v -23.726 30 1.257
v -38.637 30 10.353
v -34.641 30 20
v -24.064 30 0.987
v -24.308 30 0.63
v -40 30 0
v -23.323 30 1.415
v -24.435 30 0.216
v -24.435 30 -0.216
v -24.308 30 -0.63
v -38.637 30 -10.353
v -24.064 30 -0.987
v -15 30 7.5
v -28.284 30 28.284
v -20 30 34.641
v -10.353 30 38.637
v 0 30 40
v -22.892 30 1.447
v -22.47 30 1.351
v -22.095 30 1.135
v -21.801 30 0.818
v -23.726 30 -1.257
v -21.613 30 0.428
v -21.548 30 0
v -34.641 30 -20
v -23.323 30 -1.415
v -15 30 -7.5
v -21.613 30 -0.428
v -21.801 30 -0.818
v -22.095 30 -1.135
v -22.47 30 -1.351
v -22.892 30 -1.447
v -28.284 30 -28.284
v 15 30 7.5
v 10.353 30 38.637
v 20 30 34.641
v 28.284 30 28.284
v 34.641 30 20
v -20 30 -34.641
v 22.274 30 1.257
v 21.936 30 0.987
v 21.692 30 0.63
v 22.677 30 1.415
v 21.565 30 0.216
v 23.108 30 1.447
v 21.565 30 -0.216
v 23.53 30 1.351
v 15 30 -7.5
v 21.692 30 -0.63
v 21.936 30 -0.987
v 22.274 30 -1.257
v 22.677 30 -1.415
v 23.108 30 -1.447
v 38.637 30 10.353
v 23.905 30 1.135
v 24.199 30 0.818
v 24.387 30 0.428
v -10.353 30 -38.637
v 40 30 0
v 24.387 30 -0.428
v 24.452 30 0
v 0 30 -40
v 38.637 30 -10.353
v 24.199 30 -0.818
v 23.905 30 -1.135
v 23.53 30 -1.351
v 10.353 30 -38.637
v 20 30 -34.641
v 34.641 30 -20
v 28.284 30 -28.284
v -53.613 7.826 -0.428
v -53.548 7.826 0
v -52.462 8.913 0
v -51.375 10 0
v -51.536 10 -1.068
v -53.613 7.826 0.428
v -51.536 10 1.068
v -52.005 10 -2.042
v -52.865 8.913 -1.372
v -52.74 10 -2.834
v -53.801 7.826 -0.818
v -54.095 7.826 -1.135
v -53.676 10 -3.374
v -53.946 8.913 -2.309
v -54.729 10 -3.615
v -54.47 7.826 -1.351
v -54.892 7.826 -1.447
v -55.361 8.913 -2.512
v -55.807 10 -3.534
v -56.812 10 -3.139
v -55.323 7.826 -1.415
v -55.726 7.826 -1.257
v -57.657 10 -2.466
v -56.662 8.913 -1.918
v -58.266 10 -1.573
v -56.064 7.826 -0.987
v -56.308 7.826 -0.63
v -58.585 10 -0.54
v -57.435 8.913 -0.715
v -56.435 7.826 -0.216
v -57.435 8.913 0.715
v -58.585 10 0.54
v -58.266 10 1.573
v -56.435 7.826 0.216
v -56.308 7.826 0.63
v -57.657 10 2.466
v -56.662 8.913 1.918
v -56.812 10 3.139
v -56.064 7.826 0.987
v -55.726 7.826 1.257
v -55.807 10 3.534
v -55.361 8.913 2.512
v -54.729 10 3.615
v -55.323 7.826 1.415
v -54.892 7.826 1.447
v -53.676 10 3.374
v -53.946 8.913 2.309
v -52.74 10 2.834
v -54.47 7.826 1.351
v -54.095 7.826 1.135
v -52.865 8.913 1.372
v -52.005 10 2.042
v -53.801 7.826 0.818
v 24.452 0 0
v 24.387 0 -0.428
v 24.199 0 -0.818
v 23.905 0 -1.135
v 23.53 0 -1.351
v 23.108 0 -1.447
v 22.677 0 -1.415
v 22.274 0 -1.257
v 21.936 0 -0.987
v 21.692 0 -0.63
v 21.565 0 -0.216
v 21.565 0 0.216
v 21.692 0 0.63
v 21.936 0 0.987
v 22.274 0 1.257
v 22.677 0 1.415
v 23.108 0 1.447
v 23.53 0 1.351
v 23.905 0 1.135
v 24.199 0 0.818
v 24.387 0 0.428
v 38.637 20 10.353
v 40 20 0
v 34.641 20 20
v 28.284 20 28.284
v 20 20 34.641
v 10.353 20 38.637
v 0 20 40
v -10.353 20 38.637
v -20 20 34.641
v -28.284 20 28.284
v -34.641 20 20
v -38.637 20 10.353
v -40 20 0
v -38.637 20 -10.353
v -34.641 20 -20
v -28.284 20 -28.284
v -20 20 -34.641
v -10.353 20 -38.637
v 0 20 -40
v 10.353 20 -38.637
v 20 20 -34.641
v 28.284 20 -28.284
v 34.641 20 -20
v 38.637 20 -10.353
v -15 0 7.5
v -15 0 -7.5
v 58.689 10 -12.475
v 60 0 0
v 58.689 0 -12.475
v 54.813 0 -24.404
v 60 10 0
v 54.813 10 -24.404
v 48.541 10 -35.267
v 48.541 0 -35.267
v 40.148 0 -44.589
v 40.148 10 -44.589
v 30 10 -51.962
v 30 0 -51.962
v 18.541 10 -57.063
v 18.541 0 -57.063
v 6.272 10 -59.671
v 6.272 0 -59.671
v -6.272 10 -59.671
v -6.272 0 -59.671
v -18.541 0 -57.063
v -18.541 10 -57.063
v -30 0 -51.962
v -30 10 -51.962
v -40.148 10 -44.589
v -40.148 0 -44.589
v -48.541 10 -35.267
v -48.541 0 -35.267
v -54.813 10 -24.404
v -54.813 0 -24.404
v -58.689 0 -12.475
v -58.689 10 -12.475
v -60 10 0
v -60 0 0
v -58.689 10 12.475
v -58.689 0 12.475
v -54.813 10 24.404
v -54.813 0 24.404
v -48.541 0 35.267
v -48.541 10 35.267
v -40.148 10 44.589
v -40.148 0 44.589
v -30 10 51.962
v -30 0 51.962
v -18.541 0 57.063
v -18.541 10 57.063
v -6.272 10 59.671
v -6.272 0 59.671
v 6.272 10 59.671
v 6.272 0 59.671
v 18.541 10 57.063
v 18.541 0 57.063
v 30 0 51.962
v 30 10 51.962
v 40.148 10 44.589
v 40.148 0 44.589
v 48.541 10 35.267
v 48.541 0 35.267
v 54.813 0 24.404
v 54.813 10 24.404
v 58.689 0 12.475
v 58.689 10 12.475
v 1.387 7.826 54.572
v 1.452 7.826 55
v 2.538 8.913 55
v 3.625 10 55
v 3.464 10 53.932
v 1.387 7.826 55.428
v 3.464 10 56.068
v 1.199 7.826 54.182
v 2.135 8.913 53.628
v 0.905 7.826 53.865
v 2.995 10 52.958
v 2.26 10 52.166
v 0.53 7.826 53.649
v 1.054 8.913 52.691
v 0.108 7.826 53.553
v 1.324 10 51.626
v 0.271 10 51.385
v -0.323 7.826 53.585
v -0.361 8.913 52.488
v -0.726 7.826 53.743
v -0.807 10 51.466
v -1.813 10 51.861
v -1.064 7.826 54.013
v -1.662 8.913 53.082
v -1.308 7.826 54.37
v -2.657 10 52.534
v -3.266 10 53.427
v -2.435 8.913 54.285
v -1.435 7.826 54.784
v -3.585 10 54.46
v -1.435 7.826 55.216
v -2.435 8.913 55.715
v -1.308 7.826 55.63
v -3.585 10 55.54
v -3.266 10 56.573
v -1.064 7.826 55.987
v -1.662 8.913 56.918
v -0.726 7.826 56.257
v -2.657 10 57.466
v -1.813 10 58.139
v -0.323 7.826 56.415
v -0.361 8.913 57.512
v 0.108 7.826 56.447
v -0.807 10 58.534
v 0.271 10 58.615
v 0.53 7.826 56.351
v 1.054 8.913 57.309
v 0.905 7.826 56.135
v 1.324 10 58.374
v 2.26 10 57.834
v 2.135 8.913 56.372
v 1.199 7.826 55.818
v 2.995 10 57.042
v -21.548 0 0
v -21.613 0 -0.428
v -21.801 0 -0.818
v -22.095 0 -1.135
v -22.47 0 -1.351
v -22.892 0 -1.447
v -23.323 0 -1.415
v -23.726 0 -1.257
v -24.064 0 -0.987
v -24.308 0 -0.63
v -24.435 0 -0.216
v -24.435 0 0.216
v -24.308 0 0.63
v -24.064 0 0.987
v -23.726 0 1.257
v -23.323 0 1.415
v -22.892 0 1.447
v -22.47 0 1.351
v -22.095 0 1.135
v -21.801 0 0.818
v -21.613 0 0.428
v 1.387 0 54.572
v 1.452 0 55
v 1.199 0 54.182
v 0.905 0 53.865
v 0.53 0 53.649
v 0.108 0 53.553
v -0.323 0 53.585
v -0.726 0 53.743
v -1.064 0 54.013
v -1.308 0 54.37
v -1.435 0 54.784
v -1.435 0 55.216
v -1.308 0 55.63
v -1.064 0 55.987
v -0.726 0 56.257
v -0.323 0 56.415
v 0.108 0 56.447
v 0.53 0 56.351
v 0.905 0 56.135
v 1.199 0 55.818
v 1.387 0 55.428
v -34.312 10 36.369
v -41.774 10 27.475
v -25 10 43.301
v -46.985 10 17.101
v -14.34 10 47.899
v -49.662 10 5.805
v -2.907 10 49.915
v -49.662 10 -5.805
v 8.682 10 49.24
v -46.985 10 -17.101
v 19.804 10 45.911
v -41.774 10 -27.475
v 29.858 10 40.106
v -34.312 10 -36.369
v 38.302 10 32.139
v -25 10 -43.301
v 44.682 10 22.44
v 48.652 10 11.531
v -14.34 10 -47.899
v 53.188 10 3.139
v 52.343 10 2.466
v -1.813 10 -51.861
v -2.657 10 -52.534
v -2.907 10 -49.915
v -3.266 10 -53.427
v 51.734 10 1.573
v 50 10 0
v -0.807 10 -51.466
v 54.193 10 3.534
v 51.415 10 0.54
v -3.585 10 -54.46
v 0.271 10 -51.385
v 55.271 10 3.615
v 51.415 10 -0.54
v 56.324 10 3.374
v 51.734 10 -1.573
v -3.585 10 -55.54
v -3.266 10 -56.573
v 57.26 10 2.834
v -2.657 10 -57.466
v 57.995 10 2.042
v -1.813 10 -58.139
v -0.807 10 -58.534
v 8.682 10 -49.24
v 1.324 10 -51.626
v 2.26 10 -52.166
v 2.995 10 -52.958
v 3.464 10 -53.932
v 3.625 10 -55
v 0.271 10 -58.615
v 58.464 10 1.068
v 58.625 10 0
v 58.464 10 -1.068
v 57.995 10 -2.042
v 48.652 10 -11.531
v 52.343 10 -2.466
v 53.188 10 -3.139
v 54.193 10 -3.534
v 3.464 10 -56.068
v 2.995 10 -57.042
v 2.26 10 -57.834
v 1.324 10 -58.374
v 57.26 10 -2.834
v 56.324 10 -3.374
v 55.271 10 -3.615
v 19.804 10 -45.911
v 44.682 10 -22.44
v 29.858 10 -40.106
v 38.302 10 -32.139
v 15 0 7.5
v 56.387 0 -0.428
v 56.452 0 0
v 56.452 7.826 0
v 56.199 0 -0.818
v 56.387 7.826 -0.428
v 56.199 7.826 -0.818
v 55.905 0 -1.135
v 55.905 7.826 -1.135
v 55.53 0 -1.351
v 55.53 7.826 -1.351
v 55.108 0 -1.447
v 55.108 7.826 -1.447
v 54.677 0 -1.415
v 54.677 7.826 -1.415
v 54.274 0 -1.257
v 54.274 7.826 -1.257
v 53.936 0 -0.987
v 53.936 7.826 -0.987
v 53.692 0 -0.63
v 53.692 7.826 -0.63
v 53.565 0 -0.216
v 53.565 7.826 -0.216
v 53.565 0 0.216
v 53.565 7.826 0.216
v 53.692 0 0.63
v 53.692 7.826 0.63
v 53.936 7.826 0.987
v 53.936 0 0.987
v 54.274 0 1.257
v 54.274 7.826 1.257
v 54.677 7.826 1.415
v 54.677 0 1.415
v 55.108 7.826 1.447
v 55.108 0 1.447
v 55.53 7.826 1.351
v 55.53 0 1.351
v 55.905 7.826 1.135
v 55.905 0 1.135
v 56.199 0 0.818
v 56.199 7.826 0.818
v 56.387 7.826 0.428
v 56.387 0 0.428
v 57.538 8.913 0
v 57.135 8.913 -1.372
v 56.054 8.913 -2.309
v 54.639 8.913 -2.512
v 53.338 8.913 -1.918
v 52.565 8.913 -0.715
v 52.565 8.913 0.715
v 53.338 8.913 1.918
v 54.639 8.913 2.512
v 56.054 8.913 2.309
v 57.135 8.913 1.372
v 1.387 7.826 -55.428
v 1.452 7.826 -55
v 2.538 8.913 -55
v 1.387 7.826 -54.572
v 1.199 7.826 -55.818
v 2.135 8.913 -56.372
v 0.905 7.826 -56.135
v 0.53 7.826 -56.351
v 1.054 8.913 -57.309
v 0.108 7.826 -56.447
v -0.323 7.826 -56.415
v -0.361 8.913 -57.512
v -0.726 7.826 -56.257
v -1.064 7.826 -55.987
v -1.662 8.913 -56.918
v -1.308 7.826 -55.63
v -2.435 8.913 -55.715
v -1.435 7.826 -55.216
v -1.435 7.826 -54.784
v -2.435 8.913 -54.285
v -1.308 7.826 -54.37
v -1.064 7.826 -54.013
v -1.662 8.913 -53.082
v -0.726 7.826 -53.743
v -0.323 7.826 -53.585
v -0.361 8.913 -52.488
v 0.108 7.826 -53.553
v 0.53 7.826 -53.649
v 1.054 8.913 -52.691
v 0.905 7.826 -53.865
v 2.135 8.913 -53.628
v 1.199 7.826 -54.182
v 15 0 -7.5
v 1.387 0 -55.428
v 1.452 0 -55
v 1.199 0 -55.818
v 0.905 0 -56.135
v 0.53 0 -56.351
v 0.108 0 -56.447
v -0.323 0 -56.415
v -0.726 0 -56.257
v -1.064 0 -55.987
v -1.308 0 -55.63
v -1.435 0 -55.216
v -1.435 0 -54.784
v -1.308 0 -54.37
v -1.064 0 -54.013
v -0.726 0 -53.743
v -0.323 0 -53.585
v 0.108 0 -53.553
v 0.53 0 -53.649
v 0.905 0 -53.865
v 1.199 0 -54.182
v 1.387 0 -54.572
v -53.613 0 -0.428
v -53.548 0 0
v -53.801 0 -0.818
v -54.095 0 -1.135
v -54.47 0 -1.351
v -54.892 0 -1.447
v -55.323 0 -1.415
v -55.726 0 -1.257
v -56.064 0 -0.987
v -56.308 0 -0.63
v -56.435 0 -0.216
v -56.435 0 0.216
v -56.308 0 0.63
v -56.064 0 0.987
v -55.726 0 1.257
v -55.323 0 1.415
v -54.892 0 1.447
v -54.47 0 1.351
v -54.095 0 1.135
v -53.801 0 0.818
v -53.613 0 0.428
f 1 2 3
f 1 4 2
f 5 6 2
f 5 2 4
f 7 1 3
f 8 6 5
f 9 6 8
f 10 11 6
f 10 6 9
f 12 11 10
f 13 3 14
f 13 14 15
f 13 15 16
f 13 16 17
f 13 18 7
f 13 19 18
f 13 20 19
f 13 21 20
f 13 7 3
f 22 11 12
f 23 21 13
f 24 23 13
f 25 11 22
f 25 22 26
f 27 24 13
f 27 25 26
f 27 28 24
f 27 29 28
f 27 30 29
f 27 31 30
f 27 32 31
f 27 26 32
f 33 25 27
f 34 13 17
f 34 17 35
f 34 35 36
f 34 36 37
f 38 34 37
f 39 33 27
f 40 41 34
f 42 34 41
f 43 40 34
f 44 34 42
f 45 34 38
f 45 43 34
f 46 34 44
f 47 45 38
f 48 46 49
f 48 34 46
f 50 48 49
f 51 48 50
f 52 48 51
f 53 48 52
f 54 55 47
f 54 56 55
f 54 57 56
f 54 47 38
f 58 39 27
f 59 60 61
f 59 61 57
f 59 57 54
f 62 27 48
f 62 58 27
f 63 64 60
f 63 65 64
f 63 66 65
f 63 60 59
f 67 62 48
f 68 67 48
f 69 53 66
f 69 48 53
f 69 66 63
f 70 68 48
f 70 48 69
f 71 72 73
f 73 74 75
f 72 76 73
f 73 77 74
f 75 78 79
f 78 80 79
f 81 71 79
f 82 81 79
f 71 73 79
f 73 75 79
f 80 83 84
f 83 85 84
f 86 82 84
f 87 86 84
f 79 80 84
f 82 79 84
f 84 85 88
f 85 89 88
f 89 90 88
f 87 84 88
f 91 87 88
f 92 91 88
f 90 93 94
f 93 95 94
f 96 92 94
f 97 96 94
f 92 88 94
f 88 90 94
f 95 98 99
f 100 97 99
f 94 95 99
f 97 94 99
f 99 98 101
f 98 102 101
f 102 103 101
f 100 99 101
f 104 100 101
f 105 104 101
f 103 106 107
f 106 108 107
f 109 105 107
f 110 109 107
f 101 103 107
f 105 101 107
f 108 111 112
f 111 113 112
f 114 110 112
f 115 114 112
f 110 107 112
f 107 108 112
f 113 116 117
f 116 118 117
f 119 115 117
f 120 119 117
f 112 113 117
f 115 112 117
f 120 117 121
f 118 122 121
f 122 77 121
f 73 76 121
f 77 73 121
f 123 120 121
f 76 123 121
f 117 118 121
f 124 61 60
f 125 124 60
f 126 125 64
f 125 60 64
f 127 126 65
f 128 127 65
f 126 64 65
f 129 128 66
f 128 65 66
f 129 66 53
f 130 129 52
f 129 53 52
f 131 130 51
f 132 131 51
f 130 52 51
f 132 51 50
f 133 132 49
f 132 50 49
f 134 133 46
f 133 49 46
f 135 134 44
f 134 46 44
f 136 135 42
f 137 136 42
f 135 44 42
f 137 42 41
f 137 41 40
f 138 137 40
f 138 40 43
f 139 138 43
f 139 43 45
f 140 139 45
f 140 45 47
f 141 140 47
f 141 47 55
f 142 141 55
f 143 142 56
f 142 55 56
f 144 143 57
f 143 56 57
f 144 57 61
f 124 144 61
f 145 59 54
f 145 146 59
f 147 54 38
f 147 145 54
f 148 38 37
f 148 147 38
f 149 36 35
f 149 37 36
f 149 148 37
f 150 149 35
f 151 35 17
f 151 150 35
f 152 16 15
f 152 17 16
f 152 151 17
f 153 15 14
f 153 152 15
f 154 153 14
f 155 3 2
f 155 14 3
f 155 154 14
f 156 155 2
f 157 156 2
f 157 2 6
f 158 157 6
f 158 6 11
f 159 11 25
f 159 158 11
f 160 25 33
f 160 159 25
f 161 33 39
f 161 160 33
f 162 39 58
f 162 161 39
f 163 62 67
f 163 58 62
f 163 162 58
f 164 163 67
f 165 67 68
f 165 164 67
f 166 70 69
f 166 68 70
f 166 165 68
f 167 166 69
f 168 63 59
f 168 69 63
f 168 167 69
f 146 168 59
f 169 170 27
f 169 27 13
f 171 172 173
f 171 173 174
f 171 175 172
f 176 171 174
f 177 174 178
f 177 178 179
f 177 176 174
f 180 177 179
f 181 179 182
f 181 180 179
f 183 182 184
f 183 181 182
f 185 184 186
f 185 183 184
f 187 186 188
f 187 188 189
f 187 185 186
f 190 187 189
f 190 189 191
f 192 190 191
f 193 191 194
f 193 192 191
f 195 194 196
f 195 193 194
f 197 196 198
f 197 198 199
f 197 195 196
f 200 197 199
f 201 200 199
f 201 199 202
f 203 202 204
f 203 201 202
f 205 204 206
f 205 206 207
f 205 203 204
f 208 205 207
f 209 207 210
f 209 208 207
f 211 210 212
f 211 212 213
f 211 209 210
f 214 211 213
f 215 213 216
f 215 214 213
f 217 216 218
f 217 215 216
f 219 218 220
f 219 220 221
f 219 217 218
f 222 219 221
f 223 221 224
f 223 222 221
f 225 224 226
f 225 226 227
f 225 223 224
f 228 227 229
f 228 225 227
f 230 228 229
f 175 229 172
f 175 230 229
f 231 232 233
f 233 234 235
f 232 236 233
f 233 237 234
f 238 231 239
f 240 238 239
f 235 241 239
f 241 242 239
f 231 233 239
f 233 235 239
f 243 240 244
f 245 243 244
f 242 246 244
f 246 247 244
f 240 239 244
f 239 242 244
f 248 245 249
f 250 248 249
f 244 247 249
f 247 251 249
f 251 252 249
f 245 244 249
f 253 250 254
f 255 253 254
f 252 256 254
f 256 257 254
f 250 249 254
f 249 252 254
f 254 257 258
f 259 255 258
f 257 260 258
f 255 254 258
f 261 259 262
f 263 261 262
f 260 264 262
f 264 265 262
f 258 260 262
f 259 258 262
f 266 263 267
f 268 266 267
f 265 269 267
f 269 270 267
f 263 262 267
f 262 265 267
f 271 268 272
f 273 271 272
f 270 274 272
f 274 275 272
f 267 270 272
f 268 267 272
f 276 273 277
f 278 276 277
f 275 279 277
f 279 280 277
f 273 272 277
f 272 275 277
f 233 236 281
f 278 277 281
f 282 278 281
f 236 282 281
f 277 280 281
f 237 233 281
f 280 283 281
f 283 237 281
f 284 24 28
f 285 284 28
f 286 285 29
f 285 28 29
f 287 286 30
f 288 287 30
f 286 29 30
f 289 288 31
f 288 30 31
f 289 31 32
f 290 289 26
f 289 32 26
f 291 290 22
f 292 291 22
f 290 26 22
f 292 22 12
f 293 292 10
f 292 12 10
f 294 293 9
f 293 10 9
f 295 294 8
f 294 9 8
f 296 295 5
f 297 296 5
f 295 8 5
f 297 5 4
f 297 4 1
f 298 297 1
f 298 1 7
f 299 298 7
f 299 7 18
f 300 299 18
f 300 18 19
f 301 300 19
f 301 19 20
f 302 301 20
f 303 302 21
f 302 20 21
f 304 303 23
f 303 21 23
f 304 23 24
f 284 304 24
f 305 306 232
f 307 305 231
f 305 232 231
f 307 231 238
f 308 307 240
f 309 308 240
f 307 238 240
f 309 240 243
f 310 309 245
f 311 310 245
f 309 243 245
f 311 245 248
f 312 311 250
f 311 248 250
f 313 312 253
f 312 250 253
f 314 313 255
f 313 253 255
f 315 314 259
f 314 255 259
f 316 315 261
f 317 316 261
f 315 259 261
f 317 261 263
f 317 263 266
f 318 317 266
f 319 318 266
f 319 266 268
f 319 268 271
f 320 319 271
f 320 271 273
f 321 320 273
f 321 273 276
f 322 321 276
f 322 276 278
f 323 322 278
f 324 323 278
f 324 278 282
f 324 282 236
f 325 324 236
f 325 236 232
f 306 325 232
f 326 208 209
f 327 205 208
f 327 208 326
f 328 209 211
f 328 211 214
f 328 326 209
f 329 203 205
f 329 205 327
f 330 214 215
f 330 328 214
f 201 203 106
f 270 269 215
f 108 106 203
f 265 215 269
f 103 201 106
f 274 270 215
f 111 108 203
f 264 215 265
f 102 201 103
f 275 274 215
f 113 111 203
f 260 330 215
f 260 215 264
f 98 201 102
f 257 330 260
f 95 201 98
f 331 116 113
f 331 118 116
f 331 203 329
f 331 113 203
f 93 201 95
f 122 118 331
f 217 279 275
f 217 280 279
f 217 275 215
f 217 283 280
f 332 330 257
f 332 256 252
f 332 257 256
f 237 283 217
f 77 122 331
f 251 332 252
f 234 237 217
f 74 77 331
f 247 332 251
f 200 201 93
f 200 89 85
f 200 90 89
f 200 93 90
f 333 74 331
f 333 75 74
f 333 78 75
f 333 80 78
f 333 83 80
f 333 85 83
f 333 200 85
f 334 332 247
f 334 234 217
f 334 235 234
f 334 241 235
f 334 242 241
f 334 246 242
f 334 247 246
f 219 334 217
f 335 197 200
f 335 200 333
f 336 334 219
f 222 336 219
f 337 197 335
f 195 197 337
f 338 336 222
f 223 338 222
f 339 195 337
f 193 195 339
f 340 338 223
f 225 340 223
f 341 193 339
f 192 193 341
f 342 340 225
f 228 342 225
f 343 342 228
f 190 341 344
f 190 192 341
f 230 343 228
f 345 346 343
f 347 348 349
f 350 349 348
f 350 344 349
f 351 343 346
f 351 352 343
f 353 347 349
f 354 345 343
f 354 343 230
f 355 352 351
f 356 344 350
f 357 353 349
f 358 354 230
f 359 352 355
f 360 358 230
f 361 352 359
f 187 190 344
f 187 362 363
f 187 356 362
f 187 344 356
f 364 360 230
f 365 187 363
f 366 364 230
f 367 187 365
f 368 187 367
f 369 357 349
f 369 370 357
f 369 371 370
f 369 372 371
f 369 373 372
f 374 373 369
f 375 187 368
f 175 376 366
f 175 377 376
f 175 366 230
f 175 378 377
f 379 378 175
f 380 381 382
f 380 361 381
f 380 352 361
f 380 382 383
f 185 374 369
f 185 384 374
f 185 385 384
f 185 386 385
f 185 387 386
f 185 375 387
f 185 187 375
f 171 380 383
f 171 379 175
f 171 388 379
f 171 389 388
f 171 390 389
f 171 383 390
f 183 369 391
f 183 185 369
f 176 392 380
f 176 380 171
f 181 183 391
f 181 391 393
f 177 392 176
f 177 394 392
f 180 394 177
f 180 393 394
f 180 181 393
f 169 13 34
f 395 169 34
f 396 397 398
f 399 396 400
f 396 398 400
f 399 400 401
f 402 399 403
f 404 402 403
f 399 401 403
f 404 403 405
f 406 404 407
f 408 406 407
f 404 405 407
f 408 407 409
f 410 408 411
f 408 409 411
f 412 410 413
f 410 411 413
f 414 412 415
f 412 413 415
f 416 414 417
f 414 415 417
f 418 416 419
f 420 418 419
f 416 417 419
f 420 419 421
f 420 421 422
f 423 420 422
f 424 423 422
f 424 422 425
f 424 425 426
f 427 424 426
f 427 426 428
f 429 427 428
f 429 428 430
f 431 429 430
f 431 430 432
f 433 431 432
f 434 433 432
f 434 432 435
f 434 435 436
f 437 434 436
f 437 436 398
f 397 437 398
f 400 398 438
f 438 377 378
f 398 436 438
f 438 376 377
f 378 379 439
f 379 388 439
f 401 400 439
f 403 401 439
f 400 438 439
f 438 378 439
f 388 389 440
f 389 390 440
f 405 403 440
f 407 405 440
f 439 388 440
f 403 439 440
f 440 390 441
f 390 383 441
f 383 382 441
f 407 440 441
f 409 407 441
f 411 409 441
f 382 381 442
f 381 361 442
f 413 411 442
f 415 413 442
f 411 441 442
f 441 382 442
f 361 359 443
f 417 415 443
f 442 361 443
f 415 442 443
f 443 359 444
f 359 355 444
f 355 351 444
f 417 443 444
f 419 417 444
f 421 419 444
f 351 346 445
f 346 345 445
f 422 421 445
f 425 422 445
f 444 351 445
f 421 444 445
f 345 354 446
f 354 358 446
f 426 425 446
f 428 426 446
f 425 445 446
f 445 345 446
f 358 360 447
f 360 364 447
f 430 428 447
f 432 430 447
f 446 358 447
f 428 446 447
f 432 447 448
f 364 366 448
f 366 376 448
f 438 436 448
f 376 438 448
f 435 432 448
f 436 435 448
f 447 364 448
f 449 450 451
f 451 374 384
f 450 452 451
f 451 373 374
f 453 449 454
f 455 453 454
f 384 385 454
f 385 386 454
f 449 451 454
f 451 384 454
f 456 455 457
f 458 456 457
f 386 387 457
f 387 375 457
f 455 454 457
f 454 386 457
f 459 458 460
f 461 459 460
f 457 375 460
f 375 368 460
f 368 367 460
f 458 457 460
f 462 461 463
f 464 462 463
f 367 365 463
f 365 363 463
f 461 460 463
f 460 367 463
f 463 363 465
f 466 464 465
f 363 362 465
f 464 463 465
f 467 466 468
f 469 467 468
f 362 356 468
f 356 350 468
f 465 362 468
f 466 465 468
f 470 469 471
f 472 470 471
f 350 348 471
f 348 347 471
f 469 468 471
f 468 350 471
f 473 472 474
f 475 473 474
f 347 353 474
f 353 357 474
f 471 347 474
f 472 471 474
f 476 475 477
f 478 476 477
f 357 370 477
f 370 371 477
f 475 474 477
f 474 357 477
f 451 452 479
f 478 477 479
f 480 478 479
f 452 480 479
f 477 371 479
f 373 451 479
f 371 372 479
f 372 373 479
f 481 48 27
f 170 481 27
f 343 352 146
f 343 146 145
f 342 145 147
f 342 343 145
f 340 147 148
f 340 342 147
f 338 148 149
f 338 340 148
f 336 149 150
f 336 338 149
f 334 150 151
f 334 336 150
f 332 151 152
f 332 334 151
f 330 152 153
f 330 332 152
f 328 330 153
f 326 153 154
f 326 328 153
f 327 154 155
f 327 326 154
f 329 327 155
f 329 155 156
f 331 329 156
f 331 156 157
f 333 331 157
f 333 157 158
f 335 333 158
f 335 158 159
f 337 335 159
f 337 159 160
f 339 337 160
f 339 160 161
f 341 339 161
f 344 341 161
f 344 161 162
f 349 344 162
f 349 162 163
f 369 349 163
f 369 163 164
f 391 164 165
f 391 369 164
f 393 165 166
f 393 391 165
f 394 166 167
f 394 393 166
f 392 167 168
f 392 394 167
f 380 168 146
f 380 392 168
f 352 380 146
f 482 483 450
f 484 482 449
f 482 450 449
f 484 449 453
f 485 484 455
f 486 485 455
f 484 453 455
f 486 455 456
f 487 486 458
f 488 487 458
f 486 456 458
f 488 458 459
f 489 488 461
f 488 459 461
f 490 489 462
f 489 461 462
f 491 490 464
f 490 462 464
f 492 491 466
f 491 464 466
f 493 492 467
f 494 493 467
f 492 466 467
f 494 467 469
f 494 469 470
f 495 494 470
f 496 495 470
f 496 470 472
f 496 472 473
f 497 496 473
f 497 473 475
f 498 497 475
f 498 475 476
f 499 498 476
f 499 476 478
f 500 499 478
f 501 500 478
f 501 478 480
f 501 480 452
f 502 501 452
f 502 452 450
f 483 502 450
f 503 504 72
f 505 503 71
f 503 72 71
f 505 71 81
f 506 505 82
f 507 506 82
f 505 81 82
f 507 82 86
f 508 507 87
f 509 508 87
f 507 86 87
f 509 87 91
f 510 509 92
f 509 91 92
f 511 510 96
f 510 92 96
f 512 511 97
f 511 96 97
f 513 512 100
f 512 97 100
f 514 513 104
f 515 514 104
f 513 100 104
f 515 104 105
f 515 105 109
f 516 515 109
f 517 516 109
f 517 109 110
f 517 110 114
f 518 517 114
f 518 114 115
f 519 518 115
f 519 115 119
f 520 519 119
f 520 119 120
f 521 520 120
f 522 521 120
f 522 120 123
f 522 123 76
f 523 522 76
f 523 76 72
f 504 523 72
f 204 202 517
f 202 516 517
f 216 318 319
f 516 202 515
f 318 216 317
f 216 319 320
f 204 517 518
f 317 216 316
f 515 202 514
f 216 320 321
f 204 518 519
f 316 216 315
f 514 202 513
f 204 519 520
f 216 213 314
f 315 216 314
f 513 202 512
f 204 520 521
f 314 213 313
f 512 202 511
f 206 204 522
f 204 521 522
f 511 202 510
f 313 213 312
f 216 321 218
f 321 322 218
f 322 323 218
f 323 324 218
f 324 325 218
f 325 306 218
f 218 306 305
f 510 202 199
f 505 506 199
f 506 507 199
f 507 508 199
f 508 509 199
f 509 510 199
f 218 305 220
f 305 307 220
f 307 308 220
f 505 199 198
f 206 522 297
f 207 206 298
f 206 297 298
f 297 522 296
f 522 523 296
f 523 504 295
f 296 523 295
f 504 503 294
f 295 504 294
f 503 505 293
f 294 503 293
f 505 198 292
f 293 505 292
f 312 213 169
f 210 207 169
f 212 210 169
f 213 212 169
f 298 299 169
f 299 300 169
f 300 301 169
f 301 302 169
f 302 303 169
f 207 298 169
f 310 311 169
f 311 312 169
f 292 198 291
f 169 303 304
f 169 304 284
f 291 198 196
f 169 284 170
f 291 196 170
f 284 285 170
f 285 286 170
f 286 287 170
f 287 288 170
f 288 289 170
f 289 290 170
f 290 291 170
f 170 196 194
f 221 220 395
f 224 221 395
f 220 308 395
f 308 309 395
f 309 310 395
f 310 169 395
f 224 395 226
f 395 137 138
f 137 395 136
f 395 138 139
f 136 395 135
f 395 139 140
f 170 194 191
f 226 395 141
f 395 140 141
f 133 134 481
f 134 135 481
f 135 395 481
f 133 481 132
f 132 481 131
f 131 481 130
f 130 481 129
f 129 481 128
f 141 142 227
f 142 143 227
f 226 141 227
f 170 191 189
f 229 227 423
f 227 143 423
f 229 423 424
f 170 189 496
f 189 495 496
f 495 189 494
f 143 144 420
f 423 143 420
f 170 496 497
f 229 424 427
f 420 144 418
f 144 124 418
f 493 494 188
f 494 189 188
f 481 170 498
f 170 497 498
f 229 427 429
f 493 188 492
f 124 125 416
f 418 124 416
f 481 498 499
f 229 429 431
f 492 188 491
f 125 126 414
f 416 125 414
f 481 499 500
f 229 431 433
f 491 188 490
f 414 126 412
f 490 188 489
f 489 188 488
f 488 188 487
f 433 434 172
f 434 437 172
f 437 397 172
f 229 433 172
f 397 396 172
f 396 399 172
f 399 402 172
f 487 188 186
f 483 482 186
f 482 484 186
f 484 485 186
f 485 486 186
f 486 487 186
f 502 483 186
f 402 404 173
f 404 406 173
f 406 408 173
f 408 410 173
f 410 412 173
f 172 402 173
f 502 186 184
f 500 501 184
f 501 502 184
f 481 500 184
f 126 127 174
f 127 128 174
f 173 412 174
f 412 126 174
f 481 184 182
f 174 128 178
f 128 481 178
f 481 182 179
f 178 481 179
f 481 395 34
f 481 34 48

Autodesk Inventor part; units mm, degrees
ref_plane "YZ Plane" through (0, 0, 0) normal (1, 0, 0) x (0, 1, 0)
ref_plane "XZ Plane" through (0, 0, 0) normal (0, 1, 0) x (-1, 0, 0)
ref_plane "XY Plane" through (0, 0, 0) normal (0, 0, 1) x (1, 0, 0)
sketch "Sketch1" plane through (0, 0, 0) normal (0, 1, 0) x (-1, 0, 0)
  circle A0 centre (0, 0) radius 55
  dimension "d0" = 110
extrude "Extrusion1" add sketch "Sketch1" along normal blind 10
sketch "Sketch2" plane through (0, 10, 0) normal (0, 1, 0) x (1, 0, 0)
  circle A0 centre (0, 0) radius 50
  dimension "d3" = 100
extrude "Extrusion2" add sketch "Sketch2" along normal blind 10
chamfer "Chamfer1" distance 10 angle 45 1 edges at (-50, 20, 0)
sketch "Sketch3" plane through (0, 20, 0) normal (0, 1, 0) x (1, 0, 0)
  circle A0 centre (0, 0) radius 40
  dimension "d9" = 80
extrude "Extrusion3" add sketch "Sketch3" along normal blind 10
sketch "Sketch4" plane through (0, 10, 0) normal (0, 1, 0) x (1, 0, 0)
  circle A0 centre (0, 0) radius 60
  dimension "d12" = 120
extrude "Extrusion4" add sketch "Sketch4" against normal blind 10
sketch "Sketch5" plane through (0, 10, 0) normal (0, 1, 0) x (1, 0, 0)
  circle A0 centre (0, 55) radius 3.625
  circle A1 centre (0, 0) radius 60 projected
  circle A2 centre (-55, 0) radius 3.625
  circle A3 centre (0, -55) radius 3.625
  circle A4 centre (55, 0) radius 3.625
  dimension "d15" = 7.25
  dimension "d16" = 55
  dimension "d19" = 360
extrude "Extrusion5" cut sketch "Sketch5" against normal blind 2.1735 draft -45 contours A0 | A2 | A3 | A4
sketch "Sketch6" plane through (0, 10, 0) normal (0, 1, 0) x (1, 0, 0)
  circle A0 centre (0, 55) radius 1.4515
  circle A1 centre (0, 0) radius 60 projected
  circle A2 centre (-55, 0) radius 1.4515
  circle A3 centre (0, -55) radius 1.4515
  circle A4 centre (55, 0) radius 1.4515
  dimension "d23" = 2.903
  dimension "d24" = 55
  dimension "d27" = 360
extrude "Extrusion6" cut sketch "Sketch6" against normal through all contours A0 | A2 | A3 | A4
sketch "Sketch7" plane through (0, 30, 0) normal (0, 1, 0) x (1, 0, 0)
  line L0 (15, 7.5) -> (-15, 7.5)
  line L1 (-15, 7.5) -> (-15, -7.5)
  line L2 (-15, -7.5) -> (15, -7.5)
  line L3 (15, -7.5) -> (15, 7.5)
  line L4 (15, 7.5) -> (-15, -7.5) construction
  line L5 (-15, 7.5) -> (15, -7.5) construction
  point P0 (0, 0)
  dimension "d31" = 30
  dimension "d32" = 15
extrude "Extrusion7" cut sketch "Sketch7" against normal through all
sketch "Sketch8" plane through (0, 30, 0) normal (0, 1, 0) x (1, 0, 0)
  circle A0 centre (-23, 0) radius 1.4515
  circle A1 centre (0, 0) radius 40 projected
  circle A2 centre (23, 0) radius 1.4515
  dimension "d35" = 2.903
  dimension "d36" = 23
  dimension "d39" = 360
extrude "Extrusion8" cut sketch "Sketch8" against normal through all contours A0 | A2
properties part number "base 1"
